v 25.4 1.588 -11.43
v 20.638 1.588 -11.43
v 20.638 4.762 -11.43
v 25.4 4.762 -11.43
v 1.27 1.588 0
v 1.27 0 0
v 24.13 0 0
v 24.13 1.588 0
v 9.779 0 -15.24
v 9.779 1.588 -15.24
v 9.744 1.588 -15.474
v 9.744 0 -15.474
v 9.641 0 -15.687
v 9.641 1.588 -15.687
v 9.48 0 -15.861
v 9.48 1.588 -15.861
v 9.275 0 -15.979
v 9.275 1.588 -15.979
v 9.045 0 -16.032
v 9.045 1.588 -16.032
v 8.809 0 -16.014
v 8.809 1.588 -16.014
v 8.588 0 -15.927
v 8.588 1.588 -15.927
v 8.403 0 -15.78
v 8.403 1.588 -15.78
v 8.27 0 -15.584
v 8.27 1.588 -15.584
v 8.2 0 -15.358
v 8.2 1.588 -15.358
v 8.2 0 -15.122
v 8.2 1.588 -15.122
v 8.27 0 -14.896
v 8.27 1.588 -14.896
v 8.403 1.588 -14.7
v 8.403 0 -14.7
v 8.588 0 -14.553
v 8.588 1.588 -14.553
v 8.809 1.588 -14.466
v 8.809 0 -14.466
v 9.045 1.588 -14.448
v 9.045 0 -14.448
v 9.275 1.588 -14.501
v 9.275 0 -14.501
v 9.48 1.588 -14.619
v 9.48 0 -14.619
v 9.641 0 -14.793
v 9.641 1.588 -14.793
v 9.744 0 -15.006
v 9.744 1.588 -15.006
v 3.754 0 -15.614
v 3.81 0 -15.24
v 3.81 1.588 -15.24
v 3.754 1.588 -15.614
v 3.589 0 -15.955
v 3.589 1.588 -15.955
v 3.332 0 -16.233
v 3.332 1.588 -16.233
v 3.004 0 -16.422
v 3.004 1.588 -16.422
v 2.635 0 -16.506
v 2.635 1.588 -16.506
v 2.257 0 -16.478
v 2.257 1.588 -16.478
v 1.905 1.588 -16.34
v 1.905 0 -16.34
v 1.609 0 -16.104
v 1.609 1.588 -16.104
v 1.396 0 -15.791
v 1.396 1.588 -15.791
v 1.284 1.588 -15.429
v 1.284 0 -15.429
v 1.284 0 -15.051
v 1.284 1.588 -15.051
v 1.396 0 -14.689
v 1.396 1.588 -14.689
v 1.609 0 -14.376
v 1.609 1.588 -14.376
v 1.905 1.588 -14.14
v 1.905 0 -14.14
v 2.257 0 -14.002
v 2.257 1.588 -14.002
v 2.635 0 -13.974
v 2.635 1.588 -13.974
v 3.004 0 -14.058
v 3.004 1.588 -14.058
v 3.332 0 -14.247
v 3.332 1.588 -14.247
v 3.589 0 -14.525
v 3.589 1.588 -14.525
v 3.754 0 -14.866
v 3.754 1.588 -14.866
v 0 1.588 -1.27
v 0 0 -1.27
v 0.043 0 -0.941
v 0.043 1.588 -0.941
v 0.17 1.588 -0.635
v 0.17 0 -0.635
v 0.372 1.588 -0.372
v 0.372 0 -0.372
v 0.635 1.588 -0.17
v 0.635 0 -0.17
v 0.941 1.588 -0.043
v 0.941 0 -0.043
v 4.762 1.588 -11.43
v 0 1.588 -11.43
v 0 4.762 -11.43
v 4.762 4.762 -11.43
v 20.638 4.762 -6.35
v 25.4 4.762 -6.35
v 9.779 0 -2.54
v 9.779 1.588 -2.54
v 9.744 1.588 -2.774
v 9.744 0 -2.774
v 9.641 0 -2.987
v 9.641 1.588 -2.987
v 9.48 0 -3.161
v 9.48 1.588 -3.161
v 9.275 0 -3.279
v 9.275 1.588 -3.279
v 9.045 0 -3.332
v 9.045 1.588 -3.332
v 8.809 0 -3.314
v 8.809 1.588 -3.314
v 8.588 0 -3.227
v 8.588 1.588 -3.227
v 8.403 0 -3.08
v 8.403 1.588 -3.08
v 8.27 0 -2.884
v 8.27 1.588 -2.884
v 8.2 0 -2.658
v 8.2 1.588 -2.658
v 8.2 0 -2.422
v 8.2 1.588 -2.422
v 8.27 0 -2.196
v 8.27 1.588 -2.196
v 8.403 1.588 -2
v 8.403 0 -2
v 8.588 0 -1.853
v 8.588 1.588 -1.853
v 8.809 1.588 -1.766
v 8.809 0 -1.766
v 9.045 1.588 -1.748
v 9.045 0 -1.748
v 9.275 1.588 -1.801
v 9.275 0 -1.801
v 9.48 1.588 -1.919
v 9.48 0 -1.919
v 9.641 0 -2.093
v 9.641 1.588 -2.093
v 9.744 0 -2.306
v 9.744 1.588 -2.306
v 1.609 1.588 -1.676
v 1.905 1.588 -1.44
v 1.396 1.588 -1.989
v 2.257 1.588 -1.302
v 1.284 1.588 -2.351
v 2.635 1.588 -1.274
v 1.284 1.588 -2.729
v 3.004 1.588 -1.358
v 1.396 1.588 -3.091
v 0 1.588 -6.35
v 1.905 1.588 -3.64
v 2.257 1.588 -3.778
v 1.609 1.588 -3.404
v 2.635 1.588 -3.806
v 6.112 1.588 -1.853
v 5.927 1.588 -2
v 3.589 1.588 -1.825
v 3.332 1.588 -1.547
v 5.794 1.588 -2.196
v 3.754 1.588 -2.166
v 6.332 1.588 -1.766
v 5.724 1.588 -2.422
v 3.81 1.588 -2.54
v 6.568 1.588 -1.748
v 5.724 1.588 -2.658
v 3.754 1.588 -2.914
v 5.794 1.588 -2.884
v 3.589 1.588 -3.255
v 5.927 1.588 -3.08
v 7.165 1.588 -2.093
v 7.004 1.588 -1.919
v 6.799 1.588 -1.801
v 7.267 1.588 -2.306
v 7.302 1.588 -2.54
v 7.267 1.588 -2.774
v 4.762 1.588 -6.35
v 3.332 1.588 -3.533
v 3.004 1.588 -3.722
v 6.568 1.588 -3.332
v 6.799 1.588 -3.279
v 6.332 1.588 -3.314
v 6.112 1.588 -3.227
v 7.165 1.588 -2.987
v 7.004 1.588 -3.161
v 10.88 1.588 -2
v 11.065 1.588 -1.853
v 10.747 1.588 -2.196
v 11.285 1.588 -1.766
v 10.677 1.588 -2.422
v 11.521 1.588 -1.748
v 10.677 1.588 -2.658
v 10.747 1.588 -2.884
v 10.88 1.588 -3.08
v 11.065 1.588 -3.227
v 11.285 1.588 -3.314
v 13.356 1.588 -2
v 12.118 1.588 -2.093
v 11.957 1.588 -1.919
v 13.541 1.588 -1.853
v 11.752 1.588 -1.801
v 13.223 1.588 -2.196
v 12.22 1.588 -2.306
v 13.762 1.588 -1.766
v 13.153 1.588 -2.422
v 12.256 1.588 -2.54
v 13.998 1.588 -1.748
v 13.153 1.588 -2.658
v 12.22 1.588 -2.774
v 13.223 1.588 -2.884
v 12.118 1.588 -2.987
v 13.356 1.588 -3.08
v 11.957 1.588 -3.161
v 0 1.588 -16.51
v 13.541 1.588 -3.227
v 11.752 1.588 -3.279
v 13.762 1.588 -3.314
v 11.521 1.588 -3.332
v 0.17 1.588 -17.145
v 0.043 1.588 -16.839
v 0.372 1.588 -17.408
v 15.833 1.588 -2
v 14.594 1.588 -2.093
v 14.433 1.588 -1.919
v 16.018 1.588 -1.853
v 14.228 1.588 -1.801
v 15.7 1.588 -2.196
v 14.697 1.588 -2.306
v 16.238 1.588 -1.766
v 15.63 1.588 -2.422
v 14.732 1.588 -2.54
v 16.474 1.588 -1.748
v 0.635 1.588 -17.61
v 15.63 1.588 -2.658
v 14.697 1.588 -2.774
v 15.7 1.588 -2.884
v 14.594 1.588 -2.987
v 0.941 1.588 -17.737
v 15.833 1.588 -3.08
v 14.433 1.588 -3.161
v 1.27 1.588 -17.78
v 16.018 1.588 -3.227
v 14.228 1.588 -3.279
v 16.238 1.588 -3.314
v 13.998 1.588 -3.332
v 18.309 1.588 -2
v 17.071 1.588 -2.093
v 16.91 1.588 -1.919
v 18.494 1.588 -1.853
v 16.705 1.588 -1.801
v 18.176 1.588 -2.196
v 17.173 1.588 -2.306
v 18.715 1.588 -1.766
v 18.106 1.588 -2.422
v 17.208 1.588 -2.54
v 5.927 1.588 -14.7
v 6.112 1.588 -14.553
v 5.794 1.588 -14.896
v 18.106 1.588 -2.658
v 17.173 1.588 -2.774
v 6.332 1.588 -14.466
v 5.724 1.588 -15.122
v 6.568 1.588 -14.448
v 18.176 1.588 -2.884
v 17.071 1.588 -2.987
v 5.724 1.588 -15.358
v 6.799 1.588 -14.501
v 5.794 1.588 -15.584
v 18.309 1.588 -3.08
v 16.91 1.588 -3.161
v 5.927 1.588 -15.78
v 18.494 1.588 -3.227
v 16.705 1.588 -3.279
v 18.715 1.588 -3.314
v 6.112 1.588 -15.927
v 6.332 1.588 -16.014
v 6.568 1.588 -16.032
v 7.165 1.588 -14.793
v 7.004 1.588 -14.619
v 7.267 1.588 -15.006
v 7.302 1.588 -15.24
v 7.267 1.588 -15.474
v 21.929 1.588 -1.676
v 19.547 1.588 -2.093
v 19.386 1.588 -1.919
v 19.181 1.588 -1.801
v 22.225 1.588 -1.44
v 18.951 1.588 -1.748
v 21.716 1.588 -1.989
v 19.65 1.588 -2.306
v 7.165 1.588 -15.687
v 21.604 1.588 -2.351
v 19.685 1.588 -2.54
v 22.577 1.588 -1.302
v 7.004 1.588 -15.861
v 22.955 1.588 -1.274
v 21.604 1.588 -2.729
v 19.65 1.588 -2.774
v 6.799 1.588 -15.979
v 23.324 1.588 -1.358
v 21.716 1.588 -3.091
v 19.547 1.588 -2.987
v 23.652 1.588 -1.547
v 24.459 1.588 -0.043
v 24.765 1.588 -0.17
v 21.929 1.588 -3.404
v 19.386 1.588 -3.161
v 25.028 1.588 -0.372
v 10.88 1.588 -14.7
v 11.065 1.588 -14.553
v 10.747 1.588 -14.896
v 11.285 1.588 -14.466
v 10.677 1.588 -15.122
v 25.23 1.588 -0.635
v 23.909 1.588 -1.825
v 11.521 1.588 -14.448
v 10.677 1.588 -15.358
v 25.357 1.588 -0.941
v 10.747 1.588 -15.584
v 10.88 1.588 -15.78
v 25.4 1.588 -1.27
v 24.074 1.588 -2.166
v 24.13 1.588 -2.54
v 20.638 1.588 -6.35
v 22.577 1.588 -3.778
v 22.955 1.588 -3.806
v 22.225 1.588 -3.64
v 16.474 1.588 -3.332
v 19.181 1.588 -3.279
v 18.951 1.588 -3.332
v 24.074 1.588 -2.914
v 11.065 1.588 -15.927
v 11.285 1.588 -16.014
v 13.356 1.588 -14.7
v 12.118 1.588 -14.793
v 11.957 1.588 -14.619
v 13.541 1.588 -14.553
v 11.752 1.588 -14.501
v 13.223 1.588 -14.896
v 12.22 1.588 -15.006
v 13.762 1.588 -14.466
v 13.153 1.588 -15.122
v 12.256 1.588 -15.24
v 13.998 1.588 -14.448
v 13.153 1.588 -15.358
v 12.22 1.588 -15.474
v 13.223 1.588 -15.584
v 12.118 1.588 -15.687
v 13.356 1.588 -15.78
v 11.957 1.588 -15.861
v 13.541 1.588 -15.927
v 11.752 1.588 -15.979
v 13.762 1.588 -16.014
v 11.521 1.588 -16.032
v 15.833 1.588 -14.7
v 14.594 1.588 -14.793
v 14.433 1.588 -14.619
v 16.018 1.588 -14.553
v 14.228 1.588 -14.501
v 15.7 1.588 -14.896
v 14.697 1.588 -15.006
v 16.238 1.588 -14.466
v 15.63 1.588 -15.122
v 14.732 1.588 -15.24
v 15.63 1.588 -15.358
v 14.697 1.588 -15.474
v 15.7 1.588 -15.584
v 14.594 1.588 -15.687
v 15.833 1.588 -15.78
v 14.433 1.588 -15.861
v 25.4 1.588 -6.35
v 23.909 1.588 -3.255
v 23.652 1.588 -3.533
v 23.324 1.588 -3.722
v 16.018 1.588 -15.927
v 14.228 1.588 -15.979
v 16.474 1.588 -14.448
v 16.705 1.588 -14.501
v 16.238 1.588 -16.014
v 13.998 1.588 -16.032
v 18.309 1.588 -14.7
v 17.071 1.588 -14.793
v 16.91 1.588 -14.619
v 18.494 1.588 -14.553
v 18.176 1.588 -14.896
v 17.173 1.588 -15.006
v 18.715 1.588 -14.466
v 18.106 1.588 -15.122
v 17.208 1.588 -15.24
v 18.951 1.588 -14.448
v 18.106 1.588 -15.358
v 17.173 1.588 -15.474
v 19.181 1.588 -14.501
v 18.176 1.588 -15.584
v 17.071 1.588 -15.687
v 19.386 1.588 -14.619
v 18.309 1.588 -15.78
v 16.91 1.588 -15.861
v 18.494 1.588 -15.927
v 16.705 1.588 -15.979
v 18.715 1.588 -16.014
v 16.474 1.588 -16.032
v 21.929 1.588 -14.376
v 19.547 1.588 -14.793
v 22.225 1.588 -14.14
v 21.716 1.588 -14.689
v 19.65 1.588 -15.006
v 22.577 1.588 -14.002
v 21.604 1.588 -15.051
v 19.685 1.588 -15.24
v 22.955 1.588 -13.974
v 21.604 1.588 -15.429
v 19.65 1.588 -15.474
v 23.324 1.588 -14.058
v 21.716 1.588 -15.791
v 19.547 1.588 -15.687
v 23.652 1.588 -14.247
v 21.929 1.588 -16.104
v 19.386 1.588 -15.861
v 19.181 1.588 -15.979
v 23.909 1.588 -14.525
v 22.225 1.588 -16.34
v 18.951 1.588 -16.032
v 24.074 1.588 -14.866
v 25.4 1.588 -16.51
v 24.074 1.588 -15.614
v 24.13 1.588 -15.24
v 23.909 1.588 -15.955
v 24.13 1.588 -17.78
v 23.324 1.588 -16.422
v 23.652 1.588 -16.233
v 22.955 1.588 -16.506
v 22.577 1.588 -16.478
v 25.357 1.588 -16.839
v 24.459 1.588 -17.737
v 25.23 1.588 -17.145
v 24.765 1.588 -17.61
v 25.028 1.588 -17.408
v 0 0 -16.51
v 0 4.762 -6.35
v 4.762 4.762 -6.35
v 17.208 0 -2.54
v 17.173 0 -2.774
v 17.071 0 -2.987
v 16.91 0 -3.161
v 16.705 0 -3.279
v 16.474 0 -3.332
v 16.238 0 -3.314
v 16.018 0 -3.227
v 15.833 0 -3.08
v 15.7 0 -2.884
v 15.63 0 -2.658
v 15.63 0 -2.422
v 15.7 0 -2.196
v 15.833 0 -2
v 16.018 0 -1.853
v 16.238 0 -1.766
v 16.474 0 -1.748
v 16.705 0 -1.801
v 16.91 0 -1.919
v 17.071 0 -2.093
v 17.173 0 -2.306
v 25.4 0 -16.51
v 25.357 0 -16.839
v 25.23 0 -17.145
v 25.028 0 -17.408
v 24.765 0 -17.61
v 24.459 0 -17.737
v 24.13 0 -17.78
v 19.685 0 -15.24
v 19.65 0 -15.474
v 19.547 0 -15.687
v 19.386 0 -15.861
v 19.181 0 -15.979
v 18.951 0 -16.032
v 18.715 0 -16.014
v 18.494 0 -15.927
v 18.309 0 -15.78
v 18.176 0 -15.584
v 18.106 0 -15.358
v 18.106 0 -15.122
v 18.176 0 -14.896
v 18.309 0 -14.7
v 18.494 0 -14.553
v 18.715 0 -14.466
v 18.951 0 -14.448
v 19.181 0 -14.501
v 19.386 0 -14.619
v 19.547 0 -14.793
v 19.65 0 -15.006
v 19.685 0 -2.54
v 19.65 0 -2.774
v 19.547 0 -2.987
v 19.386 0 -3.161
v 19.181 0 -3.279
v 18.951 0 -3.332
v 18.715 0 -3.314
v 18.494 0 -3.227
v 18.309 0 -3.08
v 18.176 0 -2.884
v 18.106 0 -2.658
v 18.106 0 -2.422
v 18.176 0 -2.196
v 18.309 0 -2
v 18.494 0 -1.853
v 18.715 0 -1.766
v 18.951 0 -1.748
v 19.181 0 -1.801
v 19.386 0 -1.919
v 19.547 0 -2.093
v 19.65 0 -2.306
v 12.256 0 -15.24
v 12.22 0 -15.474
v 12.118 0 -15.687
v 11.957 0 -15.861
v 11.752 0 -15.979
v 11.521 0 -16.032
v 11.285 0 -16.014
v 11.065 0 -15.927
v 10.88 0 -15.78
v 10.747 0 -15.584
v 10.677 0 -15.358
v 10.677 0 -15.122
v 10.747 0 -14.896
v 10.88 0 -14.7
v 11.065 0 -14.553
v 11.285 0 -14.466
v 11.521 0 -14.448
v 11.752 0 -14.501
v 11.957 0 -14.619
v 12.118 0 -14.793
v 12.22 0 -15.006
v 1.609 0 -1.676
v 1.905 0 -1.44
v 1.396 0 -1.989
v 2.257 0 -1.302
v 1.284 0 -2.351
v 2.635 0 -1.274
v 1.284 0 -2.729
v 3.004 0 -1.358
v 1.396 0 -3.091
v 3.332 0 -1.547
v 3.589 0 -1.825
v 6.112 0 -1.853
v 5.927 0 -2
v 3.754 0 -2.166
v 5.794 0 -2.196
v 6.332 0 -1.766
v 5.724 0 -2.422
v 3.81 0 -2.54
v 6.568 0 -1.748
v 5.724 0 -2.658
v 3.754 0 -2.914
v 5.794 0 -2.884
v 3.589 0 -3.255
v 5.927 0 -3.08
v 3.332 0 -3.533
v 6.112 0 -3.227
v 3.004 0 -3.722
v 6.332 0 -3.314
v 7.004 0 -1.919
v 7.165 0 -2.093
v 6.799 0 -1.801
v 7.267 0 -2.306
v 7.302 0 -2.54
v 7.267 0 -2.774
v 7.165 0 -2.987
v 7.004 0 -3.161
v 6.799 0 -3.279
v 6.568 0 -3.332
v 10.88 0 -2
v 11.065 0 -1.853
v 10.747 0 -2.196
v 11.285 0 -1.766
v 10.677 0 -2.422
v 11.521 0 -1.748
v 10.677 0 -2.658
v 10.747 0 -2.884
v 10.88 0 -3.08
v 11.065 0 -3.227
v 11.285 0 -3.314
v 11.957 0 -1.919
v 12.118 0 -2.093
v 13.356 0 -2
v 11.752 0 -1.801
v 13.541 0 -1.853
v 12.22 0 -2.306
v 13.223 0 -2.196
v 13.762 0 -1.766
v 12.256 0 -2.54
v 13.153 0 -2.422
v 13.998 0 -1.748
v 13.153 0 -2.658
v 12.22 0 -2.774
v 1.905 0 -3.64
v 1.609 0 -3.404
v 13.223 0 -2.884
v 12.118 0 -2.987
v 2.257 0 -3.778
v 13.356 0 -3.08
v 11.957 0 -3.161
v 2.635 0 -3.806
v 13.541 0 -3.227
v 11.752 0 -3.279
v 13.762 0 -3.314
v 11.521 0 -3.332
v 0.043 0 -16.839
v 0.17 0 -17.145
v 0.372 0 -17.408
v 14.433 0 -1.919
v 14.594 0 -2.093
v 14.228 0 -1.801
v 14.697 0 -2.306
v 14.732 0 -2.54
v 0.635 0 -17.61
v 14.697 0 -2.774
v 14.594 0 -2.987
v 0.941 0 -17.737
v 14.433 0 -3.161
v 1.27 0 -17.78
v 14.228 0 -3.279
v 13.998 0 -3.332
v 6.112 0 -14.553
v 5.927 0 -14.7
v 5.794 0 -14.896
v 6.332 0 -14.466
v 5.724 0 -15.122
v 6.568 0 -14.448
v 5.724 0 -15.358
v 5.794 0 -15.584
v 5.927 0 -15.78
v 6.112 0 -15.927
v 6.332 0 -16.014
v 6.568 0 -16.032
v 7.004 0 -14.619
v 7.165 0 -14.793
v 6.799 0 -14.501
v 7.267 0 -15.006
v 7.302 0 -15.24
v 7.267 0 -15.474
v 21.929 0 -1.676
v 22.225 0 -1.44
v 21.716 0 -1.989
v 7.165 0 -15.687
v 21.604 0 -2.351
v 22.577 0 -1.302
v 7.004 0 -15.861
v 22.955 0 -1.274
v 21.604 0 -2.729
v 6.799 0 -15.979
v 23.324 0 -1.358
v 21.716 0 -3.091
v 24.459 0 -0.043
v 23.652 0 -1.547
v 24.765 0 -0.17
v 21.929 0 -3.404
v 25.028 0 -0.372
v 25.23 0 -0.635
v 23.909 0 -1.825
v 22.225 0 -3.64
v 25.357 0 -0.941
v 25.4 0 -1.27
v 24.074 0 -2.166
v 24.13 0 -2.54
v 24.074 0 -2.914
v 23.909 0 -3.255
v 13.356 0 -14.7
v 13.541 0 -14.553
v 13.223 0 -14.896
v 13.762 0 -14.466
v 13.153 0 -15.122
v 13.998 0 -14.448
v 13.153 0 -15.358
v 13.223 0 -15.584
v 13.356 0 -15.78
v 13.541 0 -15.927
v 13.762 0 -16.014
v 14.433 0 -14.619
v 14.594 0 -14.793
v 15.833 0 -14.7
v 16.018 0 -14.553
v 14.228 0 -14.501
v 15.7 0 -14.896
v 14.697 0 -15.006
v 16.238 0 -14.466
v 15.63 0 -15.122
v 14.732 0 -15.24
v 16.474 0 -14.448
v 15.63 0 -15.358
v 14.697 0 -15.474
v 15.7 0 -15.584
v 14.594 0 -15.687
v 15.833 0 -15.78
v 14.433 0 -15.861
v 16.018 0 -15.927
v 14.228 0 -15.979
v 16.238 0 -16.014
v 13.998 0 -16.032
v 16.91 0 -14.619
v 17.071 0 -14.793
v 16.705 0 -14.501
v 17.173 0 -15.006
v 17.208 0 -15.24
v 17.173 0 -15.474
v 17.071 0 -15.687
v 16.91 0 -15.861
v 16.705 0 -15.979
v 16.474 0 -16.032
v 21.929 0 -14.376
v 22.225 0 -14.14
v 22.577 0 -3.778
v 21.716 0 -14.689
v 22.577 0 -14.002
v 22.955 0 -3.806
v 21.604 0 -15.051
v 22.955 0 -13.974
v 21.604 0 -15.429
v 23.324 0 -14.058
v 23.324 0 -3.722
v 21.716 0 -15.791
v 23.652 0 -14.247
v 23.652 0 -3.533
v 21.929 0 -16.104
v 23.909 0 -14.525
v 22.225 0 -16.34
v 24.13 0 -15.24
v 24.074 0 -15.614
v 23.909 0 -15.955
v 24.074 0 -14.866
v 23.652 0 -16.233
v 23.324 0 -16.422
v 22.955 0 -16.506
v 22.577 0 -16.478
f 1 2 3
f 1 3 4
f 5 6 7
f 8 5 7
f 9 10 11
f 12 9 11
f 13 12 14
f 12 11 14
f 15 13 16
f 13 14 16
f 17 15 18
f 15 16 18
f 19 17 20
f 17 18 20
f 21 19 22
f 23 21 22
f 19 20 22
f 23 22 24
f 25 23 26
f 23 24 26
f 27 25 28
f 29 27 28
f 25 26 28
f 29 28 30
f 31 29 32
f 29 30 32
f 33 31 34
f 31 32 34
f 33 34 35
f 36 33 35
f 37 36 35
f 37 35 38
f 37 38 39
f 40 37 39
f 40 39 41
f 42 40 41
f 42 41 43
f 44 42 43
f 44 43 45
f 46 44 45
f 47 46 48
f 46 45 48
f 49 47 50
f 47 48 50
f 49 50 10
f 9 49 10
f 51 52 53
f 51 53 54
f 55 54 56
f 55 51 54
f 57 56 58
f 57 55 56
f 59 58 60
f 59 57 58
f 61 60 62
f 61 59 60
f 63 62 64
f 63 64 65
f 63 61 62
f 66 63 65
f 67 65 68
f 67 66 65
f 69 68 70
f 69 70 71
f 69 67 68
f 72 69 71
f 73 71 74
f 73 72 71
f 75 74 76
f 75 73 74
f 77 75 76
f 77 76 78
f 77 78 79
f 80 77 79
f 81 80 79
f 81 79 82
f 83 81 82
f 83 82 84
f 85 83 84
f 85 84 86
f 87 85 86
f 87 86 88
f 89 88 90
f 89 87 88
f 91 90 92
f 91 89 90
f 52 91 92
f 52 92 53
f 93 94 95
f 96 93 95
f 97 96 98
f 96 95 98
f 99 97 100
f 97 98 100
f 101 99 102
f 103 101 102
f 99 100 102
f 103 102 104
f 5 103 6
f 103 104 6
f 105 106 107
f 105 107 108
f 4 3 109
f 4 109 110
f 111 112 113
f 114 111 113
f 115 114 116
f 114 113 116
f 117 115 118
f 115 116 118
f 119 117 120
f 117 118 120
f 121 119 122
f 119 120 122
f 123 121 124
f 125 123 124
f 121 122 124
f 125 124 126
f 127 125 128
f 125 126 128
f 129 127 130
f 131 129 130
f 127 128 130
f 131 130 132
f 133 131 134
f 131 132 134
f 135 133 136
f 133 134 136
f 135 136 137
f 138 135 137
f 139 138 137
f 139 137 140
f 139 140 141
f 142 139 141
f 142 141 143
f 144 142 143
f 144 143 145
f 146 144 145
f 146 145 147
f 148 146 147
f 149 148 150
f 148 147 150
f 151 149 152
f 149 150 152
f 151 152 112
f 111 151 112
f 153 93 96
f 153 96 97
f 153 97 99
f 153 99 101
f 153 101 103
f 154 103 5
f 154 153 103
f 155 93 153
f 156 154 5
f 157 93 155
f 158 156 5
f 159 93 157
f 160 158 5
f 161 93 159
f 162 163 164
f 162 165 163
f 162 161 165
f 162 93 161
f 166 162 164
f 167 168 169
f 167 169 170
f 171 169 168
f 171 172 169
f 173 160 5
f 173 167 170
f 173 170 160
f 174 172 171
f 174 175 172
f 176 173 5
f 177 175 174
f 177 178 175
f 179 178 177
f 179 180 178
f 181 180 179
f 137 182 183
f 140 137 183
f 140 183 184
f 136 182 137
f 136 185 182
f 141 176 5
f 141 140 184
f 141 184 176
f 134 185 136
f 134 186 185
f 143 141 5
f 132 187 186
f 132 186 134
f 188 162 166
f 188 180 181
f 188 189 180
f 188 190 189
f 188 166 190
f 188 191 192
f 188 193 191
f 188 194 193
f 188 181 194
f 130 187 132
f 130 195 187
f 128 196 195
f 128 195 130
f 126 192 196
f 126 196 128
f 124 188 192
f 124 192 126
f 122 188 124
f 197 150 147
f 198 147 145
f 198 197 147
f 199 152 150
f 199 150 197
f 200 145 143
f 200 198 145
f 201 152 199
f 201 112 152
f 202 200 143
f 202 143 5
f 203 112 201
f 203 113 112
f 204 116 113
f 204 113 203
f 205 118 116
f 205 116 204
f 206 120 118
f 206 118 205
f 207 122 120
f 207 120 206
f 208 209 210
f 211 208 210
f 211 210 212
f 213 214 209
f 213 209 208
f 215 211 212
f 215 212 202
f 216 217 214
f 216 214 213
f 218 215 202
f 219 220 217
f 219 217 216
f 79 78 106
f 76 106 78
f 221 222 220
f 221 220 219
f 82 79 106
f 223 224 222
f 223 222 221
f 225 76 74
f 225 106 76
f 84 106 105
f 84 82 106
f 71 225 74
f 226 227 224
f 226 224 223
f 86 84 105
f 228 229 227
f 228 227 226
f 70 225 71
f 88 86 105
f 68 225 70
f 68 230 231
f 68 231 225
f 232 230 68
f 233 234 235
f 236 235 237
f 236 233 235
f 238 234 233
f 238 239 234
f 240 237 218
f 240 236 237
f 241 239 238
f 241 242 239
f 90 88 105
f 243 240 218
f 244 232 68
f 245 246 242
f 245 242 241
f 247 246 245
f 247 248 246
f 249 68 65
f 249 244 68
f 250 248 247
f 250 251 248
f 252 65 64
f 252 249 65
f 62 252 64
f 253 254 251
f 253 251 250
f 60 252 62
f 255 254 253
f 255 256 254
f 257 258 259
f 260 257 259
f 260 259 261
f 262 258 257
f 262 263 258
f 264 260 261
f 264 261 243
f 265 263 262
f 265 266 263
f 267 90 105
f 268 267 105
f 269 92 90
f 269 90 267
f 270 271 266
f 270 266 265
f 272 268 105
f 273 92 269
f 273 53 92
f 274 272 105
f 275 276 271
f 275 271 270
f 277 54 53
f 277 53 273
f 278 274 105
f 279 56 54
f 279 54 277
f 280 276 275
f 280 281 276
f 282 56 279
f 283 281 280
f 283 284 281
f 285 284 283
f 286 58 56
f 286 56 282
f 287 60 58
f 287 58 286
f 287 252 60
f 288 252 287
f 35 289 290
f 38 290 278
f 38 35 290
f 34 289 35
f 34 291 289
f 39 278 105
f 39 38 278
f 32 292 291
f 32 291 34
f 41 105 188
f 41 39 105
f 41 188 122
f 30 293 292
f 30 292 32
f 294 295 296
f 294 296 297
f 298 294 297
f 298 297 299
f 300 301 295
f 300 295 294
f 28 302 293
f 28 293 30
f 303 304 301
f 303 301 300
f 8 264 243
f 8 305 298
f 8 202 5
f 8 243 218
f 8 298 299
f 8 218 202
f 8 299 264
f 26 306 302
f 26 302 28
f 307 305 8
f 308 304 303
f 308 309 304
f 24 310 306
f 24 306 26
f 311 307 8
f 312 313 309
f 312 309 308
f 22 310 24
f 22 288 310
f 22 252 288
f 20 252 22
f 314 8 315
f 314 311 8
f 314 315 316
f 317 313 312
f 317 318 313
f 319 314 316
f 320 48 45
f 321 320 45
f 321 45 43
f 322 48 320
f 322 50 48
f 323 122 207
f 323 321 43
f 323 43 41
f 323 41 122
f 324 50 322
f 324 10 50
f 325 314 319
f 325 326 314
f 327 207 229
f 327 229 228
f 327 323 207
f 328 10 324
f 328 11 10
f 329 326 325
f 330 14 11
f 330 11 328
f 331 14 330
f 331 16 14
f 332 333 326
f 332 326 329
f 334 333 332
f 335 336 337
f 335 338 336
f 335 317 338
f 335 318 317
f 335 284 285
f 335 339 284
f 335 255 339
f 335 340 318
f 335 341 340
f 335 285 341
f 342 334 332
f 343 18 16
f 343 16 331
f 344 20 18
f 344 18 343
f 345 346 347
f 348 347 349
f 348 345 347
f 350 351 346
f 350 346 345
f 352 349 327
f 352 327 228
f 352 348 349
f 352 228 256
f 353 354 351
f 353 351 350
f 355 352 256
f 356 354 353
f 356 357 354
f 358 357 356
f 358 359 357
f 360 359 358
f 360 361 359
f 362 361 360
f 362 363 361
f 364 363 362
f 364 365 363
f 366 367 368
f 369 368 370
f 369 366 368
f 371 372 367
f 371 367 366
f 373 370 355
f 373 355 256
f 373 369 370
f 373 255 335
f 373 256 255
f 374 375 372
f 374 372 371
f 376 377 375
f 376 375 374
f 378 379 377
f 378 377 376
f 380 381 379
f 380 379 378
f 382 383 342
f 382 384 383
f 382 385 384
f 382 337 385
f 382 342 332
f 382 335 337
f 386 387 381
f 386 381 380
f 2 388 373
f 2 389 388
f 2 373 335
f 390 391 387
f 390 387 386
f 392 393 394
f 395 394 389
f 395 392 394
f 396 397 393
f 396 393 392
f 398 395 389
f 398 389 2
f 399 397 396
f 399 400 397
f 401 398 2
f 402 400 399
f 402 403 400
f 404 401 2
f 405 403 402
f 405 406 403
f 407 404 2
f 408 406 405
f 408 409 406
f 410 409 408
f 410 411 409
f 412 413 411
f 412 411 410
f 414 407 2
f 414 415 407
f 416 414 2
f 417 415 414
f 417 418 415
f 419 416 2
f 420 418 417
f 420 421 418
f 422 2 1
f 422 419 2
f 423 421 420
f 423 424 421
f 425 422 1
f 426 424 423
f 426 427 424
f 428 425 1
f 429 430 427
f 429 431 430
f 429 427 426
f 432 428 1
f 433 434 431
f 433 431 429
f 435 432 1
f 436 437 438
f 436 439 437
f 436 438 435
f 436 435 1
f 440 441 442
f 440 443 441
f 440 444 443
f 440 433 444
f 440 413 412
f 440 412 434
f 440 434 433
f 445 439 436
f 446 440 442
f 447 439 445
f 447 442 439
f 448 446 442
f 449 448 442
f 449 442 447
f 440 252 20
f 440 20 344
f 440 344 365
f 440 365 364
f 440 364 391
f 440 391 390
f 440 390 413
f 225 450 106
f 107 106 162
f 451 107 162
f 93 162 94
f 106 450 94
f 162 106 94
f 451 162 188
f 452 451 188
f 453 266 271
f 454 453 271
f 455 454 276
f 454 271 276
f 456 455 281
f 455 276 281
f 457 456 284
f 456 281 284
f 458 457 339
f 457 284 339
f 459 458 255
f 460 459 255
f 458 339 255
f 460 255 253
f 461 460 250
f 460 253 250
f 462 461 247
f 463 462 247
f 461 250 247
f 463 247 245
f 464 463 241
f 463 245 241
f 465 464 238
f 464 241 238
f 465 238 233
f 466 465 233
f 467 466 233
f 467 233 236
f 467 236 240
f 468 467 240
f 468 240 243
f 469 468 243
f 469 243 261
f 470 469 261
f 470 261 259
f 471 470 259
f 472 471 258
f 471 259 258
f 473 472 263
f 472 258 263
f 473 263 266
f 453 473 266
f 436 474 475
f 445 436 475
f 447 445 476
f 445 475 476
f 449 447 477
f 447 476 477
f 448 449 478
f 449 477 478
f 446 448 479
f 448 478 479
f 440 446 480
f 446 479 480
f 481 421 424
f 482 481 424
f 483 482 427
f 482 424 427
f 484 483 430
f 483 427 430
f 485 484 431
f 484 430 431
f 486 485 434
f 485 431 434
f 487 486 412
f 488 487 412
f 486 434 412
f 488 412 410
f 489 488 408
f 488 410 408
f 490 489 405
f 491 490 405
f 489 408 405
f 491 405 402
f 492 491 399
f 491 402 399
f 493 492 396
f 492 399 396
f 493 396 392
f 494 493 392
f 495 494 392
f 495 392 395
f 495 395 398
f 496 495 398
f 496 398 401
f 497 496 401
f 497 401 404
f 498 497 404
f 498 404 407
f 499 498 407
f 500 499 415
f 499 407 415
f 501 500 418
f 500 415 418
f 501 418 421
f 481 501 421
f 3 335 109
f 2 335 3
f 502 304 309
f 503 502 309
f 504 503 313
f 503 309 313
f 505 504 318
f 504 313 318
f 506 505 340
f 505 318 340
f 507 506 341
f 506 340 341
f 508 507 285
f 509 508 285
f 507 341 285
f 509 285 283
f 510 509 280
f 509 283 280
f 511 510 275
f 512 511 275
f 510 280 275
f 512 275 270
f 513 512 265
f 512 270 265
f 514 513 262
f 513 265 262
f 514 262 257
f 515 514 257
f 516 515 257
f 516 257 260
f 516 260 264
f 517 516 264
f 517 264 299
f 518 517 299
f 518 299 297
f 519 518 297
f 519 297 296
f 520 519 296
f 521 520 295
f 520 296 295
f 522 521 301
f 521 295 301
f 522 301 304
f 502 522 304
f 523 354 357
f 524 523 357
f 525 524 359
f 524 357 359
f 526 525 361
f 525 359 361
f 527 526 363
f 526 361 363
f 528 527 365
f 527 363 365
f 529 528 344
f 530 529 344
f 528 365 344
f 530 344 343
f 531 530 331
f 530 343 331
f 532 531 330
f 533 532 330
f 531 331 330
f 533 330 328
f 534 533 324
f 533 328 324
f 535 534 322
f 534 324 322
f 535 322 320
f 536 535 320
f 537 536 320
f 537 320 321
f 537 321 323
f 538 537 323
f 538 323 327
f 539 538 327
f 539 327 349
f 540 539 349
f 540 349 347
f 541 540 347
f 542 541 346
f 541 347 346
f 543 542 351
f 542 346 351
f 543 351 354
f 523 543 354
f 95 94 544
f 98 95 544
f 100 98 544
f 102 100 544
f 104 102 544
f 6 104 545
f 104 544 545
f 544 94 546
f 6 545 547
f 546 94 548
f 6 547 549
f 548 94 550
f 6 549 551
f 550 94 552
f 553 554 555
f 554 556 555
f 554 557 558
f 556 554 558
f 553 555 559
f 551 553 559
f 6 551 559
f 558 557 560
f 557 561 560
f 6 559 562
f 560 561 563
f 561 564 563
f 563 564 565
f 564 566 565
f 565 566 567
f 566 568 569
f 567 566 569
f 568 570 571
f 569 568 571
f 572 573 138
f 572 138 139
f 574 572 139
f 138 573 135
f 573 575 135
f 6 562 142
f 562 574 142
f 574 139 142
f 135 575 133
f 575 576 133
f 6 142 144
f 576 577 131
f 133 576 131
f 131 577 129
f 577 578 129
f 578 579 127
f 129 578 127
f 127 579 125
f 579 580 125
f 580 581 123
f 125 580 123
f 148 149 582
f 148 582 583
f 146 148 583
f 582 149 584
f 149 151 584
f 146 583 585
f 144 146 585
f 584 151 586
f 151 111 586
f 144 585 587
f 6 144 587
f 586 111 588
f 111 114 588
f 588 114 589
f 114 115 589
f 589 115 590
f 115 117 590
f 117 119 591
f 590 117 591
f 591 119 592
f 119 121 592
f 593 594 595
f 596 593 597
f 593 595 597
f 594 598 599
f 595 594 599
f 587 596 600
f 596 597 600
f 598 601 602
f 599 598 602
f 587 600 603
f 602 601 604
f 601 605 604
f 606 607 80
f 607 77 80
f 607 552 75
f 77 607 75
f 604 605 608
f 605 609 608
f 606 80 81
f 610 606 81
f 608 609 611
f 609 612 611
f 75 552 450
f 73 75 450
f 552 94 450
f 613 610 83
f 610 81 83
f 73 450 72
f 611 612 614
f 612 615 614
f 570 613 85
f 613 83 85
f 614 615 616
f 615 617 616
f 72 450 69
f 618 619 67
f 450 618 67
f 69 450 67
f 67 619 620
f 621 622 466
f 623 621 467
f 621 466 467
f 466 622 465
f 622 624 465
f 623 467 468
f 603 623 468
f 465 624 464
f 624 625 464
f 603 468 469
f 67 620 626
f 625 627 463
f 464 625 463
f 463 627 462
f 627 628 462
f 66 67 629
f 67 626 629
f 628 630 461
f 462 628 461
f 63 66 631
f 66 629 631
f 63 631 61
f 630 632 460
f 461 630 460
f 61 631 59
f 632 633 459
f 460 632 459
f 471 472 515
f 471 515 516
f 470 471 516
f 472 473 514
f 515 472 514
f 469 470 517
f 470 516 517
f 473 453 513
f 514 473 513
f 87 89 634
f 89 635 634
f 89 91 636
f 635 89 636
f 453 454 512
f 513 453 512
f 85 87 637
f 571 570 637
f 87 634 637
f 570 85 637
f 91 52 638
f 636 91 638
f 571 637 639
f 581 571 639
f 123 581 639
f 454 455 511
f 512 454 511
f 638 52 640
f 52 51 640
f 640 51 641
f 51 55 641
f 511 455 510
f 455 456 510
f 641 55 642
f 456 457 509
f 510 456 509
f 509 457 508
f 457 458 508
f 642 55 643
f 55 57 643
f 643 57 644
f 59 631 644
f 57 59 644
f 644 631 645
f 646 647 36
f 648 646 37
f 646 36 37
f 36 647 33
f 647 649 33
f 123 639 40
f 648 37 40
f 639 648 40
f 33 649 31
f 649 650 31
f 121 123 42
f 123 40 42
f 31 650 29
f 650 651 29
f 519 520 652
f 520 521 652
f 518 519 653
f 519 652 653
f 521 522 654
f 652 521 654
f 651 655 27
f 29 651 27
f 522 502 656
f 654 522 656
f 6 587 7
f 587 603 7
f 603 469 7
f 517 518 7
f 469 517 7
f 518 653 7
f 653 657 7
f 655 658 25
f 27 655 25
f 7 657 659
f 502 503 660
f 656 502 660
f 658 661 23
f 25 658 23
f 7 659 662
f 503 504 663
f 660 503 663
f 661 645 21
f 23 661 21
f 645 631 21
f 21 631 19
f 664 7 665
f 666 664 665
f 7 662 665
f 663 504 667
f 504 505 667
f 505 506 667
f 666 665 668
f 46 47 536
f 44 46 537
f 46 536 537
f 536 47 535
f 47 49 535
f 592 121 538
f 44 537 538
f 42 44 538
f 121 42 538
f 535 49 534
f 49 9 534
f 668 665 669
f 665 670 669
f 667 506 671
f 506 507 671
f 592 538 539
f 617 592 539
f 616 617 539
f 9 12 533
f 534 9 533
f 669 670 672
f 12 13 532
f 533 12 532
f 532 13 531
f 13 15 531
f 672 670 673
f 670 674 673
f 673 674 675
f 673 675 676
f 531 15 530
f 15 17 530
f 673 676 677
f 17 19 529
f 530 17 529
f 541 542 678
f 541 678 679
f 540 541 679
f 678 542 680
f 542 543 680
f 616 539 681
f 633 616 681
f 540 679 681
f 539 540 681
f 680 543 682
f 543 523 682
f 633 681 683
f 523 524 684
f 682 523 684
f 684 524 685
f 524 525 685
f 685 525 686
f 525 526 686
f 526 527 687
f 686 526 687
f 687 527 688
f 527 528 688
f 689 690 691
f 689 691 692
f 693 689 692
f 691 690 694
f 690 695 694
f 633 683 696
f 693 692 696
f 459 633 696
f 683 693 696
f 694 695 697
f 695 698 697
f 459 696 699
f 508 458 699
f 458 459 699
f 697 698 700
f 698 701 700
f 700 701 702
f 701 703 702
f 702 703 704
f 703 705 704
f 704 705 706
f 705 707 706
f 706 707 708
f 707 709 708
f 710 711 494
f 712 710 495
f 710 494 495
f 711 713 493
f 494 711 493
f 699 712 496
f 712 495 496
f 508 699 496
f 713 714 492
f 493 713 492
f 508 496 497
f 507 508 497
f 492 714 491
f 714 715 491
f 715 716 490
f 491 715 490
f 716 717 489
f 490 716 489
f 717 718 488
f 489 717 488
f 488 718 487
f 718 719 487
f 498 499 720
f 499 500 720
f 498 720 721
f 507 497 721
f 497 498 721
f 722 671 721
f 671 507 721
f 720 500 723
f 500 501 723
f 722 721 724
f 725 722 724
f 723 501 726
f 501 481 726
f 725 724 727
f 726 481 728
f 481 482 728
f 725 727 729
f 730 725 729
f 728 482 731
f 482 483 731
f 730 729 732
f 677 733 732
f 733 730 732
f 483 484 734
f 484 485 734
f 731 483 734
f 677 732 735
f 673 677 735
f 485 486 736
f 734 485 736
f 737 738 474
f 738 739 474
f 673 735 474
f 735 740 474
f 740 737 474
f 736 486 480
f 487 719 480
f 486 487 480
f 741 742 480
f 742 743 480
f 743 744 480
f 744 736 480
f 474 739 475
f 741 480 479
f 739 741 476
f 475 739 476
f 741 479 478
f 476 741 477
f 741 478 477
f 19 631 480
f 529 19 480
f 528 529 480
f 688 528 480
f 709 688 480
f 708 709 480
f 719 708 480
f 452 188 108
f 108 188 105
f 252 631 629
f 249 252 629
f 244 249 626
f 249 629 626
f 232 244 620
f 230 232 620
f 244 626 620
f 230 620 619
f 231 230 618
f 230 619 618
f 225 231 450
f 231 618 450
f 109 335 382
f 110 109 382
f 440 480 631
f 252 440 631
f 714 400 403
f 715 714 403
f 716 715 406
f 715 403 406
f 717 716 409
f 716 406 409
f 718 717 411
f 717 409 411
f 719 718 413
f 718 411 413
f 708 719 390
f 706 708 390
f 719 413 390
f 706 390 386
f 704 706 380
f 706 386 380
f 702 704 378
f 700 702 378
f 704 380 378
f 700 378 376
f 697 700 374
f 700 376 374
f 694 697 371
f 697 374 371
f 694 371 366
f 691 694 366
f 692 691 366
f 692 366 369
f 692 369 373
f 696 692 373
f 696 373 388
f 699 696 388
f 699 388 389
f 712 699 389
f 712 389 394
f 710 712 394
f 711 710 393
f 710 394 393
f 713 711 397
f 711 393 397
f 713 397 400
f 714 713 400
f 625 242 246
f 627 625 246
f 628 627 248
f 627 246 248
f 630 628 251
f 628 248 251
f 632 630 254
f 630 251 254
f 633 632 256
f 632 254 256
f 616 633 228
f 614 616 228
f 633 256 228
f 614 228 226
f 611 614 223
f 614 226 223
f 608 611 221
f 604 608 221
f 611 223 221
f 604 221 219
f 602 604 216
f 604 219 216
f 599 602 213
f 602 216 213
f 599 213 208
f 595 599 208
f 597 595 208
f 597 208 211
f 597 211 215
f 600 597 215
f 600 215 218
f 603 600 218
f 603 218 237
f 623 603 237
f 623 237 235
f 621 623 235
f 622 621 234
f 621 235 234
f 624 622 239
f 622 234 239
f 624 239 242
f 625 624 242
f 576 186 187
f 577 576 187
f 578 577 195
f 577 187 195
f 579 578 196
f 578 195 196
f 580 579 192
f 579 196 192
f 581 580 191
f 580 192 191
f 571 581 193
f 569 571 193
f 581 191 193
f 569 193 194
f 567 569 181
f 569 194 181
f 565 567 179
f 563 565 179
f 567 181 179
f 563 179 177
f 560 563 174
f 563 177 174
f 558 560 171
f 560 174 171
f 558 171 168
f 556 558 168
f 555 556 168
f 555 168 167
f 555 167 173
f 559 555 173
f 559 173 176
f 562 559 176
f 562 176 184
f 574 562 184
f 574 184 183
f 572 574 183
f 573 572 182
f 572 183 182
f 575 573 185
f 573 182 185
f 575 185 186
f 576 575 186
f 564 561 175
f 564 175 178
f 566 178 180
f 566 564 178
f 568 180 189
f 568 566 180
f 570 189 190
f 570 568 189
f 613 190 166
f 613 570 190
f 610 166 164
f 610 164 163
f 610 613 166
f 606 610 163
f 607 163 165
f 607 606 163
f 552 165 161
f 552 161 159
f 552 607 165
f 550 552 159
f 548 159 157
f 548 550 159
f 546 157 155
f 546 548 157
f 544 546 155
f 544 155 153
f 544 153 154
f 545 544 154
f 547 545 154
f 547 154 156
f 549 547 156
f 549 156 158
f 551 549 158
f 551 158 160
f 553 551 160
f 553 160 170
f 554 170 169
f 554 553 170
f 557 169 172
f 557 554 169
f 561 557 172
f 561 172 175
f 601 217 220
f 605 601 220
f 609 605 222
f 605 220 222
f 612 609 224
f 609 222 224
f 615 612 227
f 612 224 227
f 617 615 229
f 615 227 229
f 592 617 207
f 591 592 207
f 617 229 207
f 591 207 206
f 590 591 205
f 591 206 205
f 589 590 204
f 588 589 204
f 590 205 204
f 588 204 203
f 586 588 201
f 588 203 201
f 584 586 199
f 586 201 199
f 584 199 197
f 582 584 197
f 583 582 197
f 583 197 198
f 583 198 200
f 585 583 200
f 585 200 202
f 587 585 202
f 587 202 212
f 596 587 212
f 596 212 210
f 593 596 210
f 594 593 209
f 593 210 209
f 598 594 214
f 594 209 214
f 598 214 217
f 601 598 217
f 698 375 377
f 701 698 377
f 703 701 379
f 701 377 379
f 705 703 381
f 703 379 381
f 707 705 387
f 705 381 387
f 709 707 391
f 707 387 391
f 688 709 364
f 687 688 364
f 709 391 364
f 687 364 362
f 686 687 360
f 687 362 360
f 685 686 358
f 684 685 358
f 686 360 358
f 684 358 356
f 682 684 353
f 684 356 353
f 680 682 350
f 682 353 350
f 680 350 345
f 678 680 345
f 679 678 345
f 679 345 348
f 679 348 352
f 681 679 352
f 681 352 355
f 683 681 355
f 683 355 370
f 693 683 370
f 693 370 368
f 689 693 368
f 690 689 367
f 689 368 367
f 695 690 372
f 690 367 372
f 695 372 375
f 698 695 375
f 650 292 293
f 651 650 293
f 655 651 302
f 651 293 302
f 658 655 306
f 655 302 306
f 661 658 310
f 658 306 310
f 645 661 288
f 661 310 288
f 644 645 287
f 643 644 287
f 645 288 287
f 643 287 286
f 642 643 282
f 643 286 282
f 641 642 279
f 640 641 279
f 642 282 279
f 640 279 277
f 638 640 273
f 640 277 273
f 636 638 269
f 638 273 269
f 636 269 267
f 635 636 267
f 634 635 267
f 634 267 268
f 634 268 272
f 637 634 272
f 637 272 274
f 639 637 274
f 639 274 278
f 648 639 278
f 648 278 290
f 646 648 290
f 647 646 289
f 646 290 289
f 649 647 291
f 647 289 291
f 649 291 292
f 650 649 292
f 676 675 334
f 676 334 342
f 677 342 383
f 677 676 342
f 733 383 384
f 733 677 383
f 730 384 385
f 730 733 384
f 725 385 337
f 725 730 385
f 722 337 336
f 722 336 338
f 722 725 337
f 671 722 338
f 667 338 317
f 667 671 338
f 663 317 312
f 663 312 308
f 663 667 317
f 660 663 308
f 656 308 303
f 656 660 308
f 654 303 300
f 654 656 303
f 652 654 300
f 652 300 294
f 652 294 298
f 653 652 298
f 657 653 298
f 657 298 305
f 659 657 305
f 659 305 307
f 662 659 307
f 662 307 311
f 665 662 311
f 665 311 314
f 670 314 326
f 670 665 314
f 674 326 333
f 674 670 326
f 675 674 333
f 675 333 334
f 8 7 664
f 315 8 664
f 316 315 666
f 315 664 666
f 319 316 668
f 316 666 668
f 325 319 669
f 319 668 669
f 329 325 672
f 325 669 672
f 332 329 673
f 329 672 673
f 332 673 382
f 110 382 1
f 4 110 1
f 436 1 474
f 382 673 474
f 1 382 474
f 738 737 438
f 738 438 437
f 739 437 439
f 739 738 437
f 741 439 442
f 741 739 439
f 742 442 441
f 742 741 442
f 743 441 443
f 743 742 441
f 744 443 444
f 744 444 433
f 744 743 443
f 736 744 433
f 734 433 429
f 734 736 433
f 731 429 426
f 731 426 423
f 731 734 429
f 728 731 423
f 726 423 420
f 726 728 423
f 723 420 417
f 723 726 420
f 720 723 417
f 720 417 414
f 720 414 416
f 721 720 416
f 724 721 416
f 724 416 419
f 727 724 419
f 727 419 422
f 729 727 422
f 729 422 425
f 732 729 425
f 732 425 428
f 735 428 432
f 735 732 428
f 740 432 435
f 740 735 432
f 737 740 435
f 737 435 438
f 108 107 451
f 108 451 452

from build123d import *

# Parameters (mm, degrees)
SKETCH1_R           = 1.27
BOSS_EXTRUDE1_DEPTH = 1.5875
SKETCH2_R           = 0.79375
CUT_EXTRUDE1_DEPTH  = 1.5875
SKETCH4_W           = 4.7625
SKETCH4_H           = 5.08
BOSS_EXTRUDE2_DEPTH = 3.175


with BuildPart() as part:
    # Sketch1 → Boss-Extrude1 (new body)
    with BuildSketch(Plane(origin=(0, 0, 0), x_dir=(1, 0, 0), z_dir=(0, 1, 0))):
        with BuildLine():
            Line((1.27, 0), (24.13, 0))
            ThreePointArc((24.13, 0), (25.028025612, 0.371974388), (25.4, 1.27))
            Line((25.4, 1.27), (25.4, 16.51))
            ThreePointArc((25.4, 16.51), (25.028025612, 17.408025612), (24.13, 17.78))
            Line((24.13, 17.78), (1.27, 17.78))
            ThreePointArc((1.27, 17.78), (0.371974388, 17.408025612), (0, 16.51))
            Line((0, 16.51), (0, 1.27))
            ThreePointArc((0, 1.27), (0.371974388, 0.371974388), (1.27, 0))
        make_face()
        with Locations((2.54, 15.24)):
            Circle(SKETCH1_R, mode=Mode.SUBTRACT)
        with Locations((22.86, 15.24)):
            Circle(SKETCH1_R, mode=Mode.SUBTRACT)
        with Locations((22.86, 2.54)):
            Circle(SKETCH1_R, mode=Mode.SUBTRACT)
        with Locations((2.54, 2.54)):
            Circle(SKETCH1_R, mode=Mode.SUBTRACT)
    extrude(amount=BOSS_EXTRUDE1_DEPTH)

    # Sketch2 → Cut-Extrude1 (cut)
    with BuildSketch(Plane(origin=(0, 1.5875, 0), x_dir=(1, 0, 0), z_dir=(0, 1, 0))):
        with Locations((6.50875, 15.24)):
            Circle(SKETCH2_R)
        with Locations((8.98525, 15.24)):
            Circle(SKETCH2_R)
        with Locations((11.46175, 15.24)):
            Circle(SKETCH2_R)
        with Locations((13.93825, 15.24)):
            Circle(SKETCH2_R)
        with Locations((16.41475, 15.24)):
            Circle(SKETCH2_R)
        with Locations((18.89125, 15.24)):
            Circle(SKETCH2_R)
        with Locations((6.50875, 2.54)):
            Circle(SKETCH2_R)
        with Locations((8.98525, 2.54)):
            Circle(SKETCH2_R)
        with Locations((11.46175, 2.54)):
            Circle(SKETCH2_R)
        with Locations((13.93825, 2.54)):
            Circle(SKETCH2_R)
        with Locations((16.41475, 2.54)):
            Circle(SKETCH2_R)
        with Locations((18.89125, 2.54)):
            Circle(SKETCH2_R)
    extrude(amount=-CUT_EXTRUDE1_DEPTH, mode=Mode.SUBTRACT)

    # Sketch4 → Boss-Extrude2 (add)
    with BuildSketch(Plane(origin=(0, 1.5875, 0), x_dir=(1, 0, 0), z_dir=(0, 1, 0))):
        with Locations((23.01875, 8.89)):
            Rectangle(SKETCH4_W, SKETCH4_H)
        with Locations((2.38125, 8.89)):
            Rectangle(SKETCH4_W, SKETCH4_H)
    extrude(amount=BOSS_EXTRUDE2_DEPTH)


solid = part.part
